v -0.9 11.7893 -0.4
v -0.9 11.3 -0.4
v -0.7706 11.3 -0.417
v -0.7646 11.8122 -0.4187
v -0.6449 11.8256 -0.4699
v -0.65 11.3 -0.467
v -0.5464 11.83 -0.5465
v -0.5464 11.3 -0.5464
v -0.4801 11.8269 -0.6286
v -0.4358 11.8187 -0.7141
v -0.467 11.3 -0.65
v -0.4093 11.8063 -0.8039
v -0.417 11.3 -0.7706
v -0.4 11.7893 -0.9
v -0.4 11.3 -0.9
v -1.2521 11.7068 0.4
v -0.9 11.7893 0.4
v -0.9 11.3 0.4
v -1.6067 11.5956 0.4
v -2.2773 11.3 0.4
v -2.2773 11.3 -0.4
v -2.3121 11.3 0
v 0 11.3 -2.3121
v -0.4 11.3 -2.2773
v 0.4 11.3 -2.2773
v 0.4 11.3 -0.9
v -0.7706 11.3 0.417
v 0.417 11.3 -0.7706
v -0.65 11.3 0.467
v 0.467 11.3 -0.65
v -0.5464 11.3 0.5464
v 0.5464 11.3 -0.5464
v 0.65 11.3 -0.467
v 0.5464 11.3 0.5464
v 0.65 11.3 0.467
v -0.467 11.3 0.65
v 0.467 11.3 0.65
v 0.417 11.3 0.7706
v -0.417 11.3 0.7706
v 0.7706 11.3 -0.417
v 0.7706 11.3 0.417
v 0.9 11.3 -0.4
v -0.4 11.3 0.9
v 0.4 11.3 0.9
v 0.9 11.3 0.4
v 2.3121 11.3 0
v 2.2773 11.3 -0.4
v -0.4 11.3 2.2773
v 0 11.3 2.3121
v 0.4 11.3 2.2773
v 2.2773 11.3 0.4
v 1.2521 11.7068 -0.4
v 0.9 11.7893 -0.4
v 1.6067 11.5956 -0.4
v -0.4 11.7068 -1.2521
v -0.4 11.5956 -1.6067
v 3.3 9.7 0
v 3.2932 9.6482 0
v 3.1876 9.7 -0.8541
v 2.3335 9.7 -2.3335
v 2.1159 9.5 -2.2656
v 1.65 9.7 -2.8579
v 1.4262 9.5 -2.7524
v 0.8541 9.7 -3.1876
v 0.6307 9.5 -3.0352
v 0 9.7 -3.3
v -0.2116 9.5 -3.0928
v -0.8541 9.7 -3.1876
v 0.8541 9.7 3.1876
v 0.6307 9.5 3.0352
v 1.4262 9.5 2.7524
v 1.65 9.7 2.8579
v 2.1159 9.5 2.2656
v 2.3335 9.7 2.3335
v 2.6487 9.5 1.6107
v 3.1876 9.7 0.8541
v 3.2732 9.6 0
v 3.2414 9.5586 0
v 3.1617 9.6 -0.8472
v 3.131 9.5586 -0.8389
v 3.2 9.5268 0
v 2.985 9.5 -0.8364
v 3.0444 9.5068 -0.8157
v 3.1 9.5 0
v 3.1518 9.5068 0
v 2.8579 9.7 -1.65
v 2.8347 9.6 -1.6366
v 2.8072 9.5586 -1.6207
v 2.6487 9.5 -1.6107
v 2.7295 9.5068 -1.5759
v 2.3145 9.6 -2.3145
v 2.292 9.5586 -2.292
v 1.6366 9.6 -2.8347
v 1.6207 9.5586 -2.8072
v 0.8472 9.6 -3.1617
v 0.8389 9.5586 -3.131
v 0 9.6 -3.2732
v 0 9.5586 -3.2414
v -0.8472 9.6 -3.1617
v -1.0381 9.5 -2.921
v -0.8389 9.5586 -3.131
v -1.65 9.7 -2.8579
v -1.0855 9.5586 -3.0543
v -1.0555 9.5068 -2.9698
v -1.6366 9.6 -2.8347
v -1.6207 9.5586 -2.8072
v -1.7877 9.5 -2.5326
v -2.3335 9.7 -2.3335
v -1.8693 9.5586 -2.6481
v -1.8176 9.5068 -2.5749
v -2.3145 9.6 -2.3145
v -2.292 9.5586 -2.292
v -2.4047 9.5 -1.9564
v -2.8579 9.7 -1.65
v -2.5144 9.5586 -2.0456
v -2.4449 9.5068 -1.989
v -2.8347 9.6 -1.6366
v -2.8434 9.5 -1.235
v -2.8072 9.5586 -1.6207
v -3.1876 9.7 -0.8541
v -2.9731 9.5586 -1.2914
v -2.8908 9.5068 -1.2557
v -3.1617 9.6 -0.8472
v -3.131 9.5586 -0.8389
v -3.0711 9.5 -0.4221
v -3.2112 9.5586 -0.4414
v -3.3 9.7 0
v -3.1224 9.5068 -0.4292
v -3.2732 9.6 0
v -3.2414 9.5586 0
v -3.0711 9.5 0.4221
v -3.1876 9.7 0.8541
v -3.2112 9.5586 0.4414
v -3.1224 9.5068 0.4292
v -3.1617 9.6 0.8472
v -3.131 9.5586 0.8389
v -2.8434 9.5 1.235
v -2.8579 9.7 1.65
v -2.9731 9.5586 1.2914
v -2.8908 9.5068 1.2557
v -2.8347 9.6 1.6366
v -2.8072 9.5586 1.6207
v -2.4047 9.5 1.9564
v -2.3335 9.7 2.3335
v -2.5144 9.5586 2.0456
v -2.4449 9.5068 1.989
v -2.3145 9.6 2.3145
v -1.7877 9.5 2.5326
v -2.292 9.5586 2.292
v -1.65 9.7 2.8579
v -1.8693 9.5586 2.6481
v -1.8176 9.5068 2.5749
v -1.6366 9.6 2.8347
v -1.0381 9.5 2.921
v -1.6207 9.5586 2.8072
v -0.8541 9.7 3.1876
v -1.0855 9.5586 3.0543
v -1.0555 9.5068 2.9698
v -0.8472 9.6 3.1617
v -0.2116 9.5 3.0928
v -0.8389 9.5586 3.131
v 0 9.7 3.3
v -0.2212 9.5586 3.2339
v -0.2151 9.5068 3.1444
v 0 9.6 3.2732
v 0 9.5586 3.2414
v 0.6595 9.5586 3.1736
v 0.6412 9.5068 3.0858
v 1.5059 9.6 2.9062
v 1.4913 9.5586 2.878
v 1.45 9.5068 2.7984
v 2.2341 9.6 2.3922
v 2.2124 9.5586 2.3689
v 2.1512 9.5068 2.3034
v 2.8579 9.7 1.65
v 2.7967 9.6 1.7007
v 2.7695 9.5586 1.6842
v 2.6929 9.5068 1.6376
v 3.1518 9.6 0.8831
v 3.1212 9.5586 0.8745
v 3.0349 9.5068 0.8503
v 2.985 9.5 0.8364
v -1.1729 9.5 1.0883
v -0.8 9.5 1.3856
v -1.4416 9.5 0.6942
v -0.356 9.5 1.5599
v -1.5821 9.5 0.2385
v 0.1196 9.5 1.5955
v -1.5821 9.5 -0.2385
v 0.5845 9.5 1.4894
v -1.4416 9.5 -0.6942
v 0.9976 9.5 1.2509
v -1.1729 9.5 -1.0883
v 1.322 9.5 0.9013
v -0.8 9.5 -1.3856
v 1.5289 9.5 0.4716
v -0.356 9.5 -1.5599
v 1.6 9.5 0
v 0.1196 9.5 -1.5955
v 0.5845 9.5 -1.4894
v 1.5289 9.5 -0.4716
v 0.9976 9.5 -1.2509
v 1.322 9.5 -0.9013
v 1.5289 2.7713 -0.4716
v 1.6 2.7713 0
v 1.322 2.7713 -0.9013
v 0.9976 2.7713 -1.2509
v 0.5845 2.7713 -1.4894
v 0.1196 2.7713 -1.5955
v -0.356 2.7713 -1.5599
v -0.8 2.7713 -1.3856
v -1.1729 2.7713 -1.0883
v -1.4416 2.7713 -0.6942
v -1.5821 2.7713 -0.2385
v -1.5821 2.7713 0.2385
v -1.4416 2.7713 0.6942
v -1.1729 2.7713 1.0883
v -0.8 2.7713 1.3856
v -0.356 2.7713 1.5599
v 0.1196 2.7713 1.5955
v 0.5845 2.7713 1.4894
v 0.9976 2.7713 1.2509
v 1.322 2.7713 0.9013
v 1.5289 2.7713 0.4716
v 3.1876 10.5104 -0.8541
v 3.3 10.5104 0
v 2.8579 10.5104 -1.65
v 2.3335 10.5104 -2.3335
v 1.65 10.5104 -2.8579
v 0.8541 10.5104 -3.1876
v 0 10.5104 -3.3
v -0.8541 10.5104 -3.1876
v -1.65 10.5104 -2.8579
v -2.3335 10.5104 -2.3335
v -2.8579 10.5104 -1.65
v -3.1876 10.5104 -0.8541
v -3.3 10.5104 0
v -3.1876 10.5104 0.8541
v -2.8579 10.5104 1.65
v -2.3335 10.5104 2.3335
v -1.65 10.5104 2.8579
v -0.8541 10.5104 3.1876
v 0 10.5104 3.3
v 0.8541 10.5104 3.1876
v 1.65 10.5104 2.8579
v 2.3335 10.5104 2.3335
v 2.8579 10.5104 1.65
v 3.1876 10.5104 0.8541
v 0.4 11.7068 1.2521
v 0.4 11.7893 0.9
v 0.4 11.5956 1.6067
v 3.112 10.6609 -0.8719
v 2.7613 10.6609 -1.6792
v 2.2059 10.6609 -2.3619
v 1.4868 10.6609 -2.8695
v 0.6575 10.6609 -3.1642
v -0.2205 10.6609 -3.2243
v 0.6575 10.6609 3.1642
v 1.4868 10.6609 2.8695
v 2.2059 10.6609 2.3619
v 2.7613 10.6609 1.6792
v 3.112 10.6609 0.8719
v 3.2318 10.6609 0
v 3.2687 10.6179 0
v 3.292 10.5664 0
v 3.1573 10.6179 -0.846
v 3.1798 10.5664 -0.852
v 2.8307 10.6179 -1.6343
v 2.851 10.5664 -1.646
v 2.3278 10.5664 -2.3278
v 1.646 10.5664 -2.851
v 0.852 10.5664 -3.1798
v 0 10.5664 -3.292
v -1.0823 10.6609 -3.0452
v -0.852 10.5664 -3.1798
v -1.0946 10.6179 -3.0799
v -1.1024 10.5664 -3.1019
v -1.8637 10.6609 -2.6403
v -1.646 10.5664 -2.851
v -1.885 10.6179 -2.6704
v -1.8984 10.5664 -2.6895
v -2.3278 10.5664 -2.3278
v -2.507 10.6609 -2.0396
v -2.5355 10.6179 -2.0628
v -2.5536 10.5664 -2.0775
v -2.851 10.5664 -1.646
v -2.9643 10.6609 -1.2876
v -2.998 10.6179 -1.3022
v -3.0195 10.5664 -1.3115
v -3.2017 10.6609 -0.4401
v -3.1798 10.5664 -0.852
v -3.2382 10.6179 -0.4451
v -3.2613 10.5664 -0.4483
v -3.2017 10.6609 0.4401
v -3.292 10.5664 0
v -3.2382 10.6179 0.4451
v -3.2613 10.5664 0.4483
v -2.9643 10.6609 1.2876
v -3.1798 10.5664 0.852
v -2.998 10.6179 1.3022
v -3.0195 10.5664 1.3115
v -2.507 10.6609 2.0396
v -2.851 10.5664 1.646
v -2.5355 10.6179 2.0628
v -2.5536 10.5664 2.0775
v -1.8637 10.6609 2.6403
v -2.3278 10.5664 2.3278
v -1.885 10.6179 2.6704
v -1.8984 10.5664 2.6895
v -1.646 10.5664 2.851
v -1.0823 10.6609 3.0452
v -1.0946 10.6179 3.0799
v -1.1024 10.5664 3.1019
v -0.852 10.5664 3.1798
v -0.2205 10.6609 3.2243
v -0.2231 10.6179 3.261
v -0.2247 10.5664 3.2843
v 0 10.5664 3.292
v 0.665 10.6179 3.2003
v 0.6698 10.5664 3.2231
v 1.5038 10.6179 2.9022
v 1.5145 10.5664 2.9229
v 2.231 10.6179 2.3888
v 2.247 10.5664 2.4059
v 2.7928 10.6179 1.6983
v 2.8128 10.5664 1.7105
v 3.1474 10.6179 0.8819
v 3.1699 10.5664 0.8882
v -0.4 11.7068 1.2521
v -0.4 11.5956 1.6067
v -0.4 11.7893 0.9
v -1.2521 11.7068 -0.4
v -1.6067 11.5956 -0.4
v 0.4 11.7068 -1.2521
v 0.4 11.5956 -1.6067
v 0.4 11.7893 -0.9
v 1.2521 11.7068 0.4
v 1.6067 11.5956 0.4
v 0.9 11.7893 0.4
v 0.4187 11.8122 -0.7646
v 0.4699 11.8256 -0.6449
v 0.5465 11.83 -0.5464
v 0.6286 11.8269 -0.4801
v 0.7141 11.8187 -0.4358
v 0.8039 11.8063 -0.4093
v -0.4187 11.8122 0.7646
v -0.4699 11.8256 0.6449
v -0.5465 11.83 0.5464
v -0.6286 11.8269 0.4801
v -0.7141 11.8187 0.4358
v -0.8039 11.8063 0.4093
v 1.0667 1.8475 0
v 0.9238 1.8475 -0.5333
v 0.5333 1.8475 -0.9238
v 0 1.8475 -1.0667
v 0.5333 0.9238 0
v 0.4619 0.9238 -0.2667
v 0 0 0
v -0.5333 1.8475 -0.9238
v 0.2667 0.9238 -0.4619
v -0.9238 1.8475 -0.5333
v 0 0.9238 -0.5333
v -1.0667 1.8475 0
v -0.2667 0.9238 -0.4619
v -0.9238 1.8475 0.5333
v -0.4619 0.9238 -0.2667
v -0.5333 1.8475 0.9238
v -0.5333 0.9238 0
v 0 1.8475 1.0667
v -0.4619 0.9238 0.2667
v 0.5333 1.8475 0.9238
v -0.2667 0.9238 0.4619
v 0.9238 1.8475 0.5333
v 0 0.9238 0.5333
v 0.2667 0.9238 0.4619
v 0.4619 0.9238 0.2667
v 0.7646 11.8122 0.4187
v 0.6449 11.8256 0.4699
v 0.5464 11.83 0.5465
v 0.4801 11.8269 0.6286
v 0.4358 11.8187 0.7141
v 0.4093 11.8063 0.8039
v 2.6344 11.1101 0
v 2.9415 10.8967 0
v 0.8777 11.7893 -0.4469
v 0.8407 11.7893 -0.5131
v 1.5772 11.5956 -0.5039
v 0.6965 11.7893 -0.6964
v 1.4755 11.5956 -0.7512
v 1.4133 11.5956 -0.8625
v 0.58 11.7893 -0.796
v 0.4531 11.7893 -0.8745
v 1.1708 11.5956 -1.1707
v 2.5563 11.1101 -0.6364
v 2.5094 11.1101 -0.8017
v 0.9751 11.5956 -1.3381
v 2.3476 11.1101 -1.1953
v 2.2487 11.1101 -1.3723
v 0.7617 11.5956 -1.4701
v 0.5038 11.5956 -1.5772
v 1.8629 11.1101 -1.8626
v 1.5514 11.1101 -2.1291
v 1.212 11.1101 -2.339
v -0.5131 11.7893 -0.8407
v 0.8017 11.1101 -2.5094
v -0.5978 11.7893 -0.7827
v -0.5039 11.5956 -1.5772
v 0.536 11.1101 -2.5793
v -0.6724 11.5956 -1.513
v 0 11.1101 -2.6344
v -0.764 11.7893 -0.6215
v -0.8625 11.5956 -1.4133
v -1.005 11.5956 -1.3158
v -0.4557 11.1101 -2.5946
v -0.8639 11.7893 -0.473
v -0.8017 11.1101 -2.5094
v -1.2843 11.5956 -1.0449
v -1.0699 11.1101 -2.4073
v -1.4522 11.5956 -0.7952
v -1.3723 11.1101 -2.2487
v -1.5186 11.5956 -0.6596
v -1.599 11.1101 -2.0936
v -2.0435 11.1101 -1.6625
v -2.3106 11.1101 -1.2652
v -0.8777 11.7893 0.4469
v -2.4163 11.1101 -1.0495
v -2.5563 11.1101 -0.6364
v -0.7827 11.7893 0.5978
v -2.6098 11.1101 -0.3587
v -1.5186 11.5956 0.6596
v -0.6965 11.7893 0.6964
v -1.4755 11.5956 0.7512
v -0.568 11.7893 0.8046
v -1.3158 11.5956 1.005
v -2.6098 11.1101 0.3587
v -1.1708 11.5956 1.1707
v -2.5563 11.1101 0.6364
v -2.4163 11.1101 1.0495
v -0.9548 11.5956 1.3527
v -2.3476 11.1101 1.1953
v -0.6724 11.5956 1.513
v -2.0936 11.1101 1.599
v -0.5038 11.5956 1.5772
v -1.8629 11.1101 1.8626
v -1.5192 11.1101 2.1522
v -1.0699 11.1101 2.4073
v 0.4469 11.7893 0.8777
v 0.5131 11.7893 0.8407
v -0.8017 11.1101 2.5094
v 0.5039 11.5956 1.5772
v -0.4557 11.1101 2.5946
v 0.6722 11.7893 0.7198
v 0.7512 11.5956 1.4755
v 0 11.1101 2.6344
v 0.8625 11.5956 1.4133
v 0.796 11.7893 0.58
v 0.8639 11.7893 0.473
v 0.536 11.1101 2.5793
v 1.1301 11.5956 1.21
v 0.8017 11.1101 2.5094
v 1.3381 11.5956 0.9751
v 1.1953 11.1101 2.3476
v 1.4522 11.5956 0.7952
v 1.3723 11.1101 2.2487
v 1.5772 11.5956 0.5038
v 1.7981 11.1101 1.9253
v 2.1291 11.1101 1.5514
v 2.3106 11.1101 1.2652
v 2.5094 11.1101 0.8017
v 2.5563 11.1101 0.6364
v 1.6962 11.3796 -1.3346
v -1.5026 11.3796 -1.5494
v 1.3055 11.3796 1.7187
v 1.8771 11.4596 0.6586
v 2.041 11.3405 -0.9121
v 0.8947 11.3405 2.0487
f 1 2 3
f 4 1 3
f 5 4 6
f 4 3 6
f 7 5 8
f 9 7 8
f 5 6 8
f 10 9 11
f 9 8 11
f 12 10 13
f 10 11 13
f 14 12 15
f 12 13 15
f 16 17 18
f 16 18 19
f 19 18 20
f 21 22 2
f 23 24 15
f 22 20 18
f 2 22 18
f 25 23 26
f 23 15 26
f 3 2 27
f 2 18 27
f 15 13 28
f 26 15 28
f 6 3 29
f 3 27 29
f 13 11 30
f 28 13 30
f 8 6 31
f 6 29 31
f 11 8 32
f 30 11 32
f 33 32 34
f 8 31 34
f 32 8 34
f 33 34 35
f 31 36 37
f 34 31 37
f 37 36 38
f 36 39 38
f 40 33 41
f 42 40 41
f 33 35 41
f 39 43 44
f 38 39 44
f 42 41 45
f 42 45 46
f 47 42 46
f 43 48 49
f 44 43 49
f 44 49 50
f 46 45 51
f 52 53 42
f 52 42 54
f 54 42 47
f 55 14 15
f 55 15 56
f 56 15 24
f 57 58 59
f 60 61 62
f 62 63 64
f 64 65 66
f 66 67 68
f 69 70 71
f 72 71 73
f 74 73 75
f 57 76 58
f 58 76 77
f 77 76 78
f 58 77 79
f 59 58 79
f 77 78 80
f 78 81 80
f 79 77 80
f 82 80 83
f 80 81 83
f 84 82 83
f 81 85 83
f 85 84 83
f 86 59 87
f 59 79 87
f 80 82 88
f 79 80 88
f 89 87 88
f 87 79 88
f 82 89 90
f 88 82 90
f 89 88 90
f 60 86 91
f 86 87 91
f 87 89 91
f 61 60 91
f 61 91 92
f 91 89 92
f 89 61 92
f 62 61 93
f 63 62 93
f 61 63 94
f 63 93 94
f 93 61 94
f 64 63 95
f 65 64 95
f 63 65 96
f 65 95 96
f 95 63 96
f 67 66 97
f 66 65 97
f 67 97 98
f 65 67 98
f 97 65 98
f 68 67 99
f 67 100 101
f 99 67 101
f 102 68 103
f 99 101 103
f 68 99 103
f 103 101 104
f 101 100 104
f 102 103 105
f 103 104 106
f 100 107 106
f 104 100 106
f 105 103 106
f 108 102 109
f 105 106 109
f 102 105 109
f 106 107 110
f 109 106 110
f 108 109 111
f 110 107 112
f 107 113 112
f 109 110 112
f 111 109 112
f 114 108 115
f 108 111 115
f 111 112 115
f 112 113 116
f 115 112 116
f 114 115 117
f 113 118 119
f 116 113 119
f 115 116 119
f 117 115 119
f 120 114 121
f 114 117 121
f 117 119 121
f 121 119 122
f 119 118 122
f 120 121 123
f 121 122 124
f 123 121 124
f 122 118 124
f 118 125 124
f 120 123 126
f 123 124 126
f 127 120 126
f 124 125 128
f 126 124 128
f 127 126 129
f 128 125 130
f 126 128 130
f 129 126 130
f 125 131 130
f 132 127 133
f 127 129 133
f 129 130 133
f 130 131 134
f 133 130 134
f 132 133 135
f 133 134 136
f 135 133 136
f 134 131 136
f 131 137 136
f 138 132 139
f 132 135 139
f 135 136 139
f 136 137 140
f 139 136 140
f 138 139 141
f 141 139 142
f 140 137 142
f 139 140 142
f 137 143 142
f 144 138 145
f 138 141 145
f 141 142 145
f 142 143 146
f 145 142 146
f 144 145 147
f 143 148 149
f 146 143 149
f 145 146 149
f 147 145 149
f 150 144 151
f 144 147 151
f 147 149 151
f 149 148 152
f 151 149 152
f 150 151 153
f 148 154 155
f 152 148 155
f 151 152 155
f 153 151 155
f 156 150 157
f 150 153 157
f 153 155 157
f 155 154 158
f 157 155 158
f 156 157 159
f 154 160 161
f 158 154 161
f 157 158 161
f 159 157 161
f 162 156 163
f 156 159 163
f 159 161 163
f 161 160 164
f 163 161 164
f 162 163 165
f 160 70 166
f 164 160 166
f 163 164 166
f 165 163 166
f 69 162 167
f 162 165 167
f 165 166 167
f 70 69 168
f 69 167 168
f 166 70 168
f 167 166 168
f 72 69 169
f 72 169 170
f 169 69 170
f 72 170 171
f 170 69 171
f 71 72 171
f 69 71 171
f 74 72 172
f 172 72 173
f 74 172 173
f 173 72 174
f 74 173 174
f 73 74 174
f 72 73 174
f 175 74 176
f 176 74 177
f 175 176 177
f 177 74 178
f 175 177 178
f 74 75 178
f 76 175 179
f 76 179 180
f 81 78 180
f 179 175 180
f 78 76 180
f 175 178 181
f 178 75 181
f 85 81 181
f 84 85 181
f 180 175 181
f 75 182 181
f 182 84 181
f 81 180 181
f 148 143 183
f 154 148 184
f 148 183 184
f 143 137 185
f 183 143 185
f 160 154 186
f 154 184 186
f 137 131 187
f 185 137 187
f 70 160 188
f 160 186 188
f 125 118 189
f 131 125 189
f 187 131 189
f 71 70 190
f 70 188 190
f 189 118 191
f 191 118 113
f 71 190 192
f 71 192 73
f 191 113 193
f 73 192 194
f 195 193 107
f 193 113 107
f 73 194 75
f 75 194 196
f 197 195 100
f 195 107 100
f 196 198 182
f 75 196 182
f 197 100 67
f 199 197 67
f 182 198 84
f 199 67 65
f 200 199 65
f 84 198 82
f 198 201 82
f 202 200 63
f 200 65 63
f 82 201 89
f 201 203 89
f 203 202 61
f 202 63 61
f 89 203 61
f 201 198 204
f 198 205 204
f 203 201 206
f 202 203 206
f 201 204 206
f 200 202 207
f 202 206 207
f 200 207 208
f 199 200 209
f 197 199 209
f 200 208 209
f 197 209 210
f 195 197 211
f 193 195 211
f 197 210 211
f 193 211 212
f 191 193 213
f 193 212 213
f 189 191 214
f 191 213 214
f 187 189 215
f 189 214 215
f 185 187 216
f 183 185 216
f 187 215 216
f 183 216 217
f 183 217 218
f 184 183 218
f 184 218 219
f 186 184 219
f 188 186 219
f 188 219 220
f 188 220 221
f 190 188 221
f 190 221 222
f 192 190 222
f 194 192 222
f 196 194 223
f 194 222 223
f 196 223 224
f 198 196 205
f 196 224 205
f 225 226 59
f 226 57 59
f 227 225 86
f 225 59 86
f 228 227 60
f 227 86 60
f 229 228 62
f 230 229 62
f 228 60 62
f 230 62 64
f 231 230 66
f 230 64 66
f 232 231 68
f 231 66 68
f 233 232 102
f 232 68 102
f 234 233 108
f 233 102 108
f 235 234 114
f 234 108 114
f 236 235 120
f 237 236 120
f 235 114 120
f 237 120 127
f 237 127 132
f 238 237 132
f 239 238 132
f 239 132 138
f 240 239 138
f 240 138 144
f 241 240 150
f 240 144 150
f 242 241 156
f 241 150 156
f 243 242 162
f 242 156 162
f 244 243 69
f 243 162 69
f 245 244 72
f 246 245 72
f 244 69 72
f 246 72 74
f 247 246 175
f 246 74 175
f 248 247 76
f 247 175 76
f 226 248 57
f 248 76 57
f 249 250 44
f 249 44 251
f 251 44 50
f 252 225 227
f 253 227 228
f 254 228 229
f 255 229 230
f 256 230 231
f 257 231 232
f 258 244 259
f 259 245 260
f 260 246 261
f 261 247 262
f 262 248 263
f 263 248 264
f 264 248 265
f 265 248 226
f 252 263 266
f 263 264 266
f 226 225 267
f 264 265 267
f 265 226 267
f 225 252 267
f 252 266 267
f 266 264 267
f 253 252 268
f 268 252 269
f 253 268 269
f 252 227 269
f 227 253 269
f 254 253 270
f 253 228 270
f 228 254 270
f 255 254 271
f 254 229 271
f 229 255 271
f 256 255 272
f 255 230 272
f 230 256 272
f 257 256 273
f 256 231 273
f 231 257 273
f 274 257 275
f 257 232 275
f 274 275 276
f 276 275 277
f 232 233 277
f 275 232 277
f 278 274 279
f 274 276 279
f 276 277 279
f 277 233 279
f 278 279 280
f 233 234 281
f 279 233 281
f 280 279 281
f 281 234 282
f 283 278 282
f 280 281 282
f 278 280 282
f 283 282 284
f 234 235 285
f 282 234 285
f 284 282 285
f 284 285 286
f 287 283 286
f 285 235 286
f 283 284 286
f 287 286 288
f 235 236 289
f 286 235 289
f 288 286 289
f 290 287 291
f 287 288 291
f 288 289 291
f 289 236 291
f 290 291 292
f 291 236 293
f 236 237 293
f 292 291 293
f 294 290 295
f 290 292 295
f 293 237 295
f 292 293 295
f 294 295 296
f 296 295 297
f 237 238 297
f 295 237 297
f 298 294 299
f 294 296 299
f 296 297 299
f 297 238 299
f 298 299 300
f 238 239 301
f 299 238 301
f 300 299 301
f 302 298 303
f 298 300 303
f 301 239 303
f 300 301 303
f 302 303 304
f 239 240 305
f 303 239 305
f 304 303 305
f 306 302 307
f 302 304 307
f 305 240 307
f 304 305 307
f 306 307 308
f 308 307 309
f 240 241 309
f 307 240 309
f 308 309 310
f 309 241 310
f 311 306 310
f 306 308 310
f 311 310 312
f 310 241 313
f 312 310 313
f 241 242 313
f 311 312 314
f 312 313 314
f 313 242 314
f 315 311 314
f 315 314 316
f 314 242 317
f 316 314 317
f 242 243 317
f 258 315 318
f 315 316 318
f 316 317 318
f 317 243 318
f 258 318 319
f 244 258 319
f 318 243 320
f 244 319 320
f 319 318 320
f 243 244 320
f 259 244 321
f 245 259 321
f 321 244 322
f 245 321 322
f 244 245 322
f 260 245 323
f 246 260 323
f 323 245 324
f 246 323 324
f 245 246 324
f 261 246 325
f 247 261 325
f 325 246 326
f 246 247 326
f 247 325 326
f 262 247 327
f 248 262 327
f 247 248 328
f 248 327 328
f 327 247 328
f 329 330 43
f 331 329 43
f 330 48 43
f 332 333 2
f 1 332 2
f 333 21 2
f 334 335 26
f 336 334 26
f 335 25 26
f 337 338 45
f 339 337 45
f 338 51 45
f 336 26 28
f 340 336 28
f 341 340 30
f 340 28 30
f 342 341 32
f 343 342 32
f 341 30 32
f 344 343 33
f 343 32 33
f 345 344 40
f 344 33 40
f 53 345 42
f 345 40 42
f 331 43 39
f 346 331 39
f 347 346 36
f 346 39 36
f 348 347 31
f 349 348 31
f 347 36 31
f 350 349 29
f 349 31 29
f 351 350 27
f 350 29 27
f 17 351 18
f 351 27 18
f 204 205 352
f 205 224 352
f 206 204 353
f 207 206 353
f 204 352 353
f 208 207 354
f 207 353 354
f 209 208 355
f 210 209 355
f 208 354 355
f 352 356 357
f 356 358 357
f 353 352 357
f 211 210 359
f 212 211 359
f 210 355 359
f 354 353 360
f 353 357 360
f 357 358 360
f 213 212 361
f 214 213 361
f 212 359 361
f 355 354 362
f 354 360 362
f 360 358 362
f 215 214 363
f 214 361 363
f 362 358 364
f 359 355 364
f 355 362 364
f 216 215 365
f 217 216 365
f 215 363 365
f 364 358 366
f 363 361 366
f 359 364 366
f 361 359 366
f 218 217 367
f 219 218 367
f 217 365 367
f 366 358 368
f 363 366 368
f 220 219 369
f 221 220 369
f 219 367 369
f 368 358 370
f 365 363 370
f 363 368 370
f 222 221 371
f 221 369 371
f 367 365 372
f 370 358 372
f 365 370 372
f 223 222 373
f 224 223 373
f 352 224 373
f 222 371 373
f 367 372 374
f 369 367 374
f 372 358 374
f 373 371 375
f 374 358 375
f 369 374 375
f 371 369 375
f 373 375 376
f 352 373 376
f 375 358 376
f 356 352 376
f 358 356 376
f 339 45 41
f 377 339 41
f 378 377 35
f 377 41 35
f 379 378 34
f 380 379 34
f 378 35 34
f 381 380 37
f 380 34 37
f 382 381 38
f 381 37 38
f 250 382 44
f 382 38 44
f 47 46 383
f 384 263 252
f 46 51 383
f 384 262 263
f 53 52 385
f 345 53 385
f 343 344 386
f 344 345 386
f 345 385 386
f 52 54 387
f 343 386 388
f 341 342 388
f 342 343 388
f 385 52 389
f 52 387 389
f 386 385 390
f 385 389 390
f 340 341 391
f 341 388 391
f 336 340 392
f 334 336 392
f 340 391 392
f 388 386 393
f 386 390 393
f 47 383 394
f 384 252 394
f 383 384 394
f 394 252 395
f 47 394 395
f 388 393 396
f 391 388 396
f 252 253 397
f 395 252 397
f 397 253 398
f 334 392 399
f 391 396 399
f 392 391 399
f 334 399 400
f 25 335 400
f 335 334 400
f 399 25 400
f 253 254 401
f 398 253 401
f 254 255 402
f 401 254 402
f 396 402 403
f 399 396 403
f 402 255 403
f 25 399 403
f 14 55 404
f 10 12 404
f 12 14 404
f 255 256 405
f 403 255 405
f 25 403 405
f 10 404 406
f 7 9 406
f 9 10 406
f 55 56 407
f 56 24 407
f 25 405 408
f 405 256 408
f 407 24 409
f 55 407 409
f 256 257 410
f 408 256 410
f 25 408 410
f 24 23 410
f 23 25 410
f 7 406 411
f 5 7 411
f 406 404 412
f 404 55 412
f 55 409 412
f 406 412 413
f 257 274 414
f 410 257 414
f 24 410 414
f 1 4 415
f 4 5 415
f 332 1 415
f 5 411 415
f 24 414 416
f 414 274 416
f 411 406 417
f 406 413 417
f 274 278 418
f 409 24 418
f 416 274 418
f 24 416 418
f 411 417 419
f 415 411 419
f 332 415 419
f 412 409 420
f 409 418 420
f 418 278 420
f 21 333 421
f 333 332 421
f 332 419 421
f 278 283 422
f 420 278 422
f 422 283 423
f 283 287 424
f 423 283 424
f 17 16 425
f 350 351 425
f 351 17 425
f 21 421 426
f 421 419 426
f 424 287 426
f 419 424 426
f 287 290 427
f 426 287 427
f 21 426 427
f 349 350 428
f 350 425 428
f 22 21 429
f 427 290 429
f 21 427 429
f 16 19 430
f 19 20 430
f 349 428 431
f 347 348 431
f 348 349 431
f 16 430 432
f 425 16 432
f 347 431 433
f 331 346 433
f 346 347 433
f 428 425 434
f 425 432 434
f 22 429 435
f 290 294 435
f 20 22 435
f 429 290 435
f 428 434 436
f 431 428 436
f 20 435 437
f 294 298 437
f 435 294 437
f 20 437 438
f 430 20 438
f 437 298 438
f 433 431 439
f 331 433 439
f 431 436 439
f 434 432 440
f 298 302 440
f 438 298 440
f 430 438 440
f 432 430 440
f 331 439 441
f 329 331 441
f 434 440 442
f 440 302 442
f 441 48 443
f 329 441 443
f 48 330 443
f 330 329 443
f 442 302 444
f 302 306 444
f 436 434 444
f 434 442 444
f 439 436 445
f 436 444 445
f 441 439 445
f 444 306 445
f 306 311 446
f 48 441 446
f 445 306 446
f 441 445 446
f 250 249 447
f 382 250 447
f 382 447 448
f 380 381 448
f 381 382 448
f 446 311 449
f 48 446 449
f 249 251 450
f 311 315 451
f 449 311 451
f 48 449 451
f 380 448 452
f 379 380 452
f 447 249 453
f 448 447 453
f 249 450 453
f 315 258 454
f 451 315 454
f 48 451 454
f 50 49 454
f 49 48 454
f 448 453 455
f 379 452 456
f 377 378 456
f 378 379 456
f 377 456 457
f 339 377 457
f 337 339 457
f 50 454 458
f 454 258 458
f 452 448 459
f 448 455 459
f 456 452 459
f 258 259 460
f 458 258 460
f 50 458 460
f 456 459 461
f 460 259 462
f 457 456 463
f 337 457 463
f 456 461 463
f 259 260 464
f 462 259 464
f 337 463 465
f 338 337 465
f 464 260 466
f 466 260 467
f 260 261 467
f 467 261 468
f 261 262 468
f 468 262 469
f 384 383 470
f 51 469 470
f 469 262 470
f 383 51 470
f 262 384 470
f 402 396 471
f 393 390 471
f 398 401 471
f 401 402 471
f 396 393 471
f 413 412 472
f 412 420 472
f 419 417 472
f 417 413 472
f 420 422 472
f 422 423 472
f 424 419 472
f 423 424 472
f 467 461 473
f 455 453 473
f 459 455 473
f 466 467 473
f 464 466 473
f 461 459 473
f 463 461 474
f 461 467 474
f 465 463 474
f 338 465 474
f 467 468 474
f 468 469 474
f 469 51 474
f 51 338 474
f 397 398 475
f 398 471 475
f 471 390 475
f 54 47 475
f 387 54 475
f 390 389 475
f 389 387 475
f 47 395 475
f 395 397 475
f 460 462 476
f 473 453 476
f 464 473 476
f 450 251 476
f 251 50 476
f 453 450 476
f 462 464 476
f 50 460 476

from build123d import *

# Parameters (mm, degrees)
CORTAR_EXTRUIR1_START = -1.8
CORTAR_EXTRUIR1_DEPTH = 3


with BuildPart() as part:
    # Croquis1 → Revolución1 (revolve)
    with BuildSketch(Plane.XY):
        with BuildLine():
            Line((0, 0), (0, 11.9))
            ThreePointArc((0, 11.9), (1.726548348, 11.569000929), (3.231811568, 10.660864252))
            ThreePointArc((3.231811568, 10.660864252), (3.282156956, 10.593022088), (3.3, 10.5104458))
            Line((3.3, 10.5104458), (3.3, 9.7))
            ThreePointArc((3.3, 9.7), (3.241421356, 9.558578644), (3.1, 9.5))
            Line((3.1, 9.5), (1.6, 9.5))
            Line((1.6, 9.5), (1.6, 2.771281292))
            Line((1.6, 2.771281292), (0, 0))
        make_face()
    revolve(axis=Axis((0, 0, 0), (0, 1, 0)))

    # Croquis2 → Cortar-Extruir1 (cut)
    with BuildSketch(Plane.XZ.offset(-9.5).offset(CORTAR_EXTRUIR1_START)):
        with BuildLine():
            Line((-0.4, 3.2), (-0.4, 0.9))
            ThreePointArc((-0.4, 0.9), (-0.546446609, 0.546446609), (-0.9, 0.4))
            Line((-0.9, 0.4), (-3.2, 0.4))
            Line((-3.2, 0.4), (-3.2, -0.4))
            Line((-3.2, -0.4), (-0.9, -0.4))
            ThreePointArc((-0.9, -0.4), (-0.546446609, -0.546446609), (-0.4, -0.9))
            Line((-0.4, -0.9), (-0.4, -3.2))
            Line((-0.4, -3.2), (0.4, -3.2))
            Line((0.4, -3.2), (0.4, -0.9))
            ThreePointArc((0.4, -0.9), (0.546446609, -0.546446609), (0.9, -0.4))
            Line((0.9, -0.4), (3.2, -0.4))
            Line((3.2, -0.4), (3.2, 0.4))
            Line((3.2, 0.4), (0.9, 0.4))
            ThreePointArc((0.9, 0.4), (0.546446609, 0.546446609), (0.4, 0.9))
            Line((0.4, 0.9), (0.4, 3.2))
            Line((0.4, 3.2), (-0.4, 3.2))
        make_face()
    extrude(amount=-CORTAR_EXTRUIR1_DEPTH, mode=Mode.SUBTRACT)


solid = part.part
